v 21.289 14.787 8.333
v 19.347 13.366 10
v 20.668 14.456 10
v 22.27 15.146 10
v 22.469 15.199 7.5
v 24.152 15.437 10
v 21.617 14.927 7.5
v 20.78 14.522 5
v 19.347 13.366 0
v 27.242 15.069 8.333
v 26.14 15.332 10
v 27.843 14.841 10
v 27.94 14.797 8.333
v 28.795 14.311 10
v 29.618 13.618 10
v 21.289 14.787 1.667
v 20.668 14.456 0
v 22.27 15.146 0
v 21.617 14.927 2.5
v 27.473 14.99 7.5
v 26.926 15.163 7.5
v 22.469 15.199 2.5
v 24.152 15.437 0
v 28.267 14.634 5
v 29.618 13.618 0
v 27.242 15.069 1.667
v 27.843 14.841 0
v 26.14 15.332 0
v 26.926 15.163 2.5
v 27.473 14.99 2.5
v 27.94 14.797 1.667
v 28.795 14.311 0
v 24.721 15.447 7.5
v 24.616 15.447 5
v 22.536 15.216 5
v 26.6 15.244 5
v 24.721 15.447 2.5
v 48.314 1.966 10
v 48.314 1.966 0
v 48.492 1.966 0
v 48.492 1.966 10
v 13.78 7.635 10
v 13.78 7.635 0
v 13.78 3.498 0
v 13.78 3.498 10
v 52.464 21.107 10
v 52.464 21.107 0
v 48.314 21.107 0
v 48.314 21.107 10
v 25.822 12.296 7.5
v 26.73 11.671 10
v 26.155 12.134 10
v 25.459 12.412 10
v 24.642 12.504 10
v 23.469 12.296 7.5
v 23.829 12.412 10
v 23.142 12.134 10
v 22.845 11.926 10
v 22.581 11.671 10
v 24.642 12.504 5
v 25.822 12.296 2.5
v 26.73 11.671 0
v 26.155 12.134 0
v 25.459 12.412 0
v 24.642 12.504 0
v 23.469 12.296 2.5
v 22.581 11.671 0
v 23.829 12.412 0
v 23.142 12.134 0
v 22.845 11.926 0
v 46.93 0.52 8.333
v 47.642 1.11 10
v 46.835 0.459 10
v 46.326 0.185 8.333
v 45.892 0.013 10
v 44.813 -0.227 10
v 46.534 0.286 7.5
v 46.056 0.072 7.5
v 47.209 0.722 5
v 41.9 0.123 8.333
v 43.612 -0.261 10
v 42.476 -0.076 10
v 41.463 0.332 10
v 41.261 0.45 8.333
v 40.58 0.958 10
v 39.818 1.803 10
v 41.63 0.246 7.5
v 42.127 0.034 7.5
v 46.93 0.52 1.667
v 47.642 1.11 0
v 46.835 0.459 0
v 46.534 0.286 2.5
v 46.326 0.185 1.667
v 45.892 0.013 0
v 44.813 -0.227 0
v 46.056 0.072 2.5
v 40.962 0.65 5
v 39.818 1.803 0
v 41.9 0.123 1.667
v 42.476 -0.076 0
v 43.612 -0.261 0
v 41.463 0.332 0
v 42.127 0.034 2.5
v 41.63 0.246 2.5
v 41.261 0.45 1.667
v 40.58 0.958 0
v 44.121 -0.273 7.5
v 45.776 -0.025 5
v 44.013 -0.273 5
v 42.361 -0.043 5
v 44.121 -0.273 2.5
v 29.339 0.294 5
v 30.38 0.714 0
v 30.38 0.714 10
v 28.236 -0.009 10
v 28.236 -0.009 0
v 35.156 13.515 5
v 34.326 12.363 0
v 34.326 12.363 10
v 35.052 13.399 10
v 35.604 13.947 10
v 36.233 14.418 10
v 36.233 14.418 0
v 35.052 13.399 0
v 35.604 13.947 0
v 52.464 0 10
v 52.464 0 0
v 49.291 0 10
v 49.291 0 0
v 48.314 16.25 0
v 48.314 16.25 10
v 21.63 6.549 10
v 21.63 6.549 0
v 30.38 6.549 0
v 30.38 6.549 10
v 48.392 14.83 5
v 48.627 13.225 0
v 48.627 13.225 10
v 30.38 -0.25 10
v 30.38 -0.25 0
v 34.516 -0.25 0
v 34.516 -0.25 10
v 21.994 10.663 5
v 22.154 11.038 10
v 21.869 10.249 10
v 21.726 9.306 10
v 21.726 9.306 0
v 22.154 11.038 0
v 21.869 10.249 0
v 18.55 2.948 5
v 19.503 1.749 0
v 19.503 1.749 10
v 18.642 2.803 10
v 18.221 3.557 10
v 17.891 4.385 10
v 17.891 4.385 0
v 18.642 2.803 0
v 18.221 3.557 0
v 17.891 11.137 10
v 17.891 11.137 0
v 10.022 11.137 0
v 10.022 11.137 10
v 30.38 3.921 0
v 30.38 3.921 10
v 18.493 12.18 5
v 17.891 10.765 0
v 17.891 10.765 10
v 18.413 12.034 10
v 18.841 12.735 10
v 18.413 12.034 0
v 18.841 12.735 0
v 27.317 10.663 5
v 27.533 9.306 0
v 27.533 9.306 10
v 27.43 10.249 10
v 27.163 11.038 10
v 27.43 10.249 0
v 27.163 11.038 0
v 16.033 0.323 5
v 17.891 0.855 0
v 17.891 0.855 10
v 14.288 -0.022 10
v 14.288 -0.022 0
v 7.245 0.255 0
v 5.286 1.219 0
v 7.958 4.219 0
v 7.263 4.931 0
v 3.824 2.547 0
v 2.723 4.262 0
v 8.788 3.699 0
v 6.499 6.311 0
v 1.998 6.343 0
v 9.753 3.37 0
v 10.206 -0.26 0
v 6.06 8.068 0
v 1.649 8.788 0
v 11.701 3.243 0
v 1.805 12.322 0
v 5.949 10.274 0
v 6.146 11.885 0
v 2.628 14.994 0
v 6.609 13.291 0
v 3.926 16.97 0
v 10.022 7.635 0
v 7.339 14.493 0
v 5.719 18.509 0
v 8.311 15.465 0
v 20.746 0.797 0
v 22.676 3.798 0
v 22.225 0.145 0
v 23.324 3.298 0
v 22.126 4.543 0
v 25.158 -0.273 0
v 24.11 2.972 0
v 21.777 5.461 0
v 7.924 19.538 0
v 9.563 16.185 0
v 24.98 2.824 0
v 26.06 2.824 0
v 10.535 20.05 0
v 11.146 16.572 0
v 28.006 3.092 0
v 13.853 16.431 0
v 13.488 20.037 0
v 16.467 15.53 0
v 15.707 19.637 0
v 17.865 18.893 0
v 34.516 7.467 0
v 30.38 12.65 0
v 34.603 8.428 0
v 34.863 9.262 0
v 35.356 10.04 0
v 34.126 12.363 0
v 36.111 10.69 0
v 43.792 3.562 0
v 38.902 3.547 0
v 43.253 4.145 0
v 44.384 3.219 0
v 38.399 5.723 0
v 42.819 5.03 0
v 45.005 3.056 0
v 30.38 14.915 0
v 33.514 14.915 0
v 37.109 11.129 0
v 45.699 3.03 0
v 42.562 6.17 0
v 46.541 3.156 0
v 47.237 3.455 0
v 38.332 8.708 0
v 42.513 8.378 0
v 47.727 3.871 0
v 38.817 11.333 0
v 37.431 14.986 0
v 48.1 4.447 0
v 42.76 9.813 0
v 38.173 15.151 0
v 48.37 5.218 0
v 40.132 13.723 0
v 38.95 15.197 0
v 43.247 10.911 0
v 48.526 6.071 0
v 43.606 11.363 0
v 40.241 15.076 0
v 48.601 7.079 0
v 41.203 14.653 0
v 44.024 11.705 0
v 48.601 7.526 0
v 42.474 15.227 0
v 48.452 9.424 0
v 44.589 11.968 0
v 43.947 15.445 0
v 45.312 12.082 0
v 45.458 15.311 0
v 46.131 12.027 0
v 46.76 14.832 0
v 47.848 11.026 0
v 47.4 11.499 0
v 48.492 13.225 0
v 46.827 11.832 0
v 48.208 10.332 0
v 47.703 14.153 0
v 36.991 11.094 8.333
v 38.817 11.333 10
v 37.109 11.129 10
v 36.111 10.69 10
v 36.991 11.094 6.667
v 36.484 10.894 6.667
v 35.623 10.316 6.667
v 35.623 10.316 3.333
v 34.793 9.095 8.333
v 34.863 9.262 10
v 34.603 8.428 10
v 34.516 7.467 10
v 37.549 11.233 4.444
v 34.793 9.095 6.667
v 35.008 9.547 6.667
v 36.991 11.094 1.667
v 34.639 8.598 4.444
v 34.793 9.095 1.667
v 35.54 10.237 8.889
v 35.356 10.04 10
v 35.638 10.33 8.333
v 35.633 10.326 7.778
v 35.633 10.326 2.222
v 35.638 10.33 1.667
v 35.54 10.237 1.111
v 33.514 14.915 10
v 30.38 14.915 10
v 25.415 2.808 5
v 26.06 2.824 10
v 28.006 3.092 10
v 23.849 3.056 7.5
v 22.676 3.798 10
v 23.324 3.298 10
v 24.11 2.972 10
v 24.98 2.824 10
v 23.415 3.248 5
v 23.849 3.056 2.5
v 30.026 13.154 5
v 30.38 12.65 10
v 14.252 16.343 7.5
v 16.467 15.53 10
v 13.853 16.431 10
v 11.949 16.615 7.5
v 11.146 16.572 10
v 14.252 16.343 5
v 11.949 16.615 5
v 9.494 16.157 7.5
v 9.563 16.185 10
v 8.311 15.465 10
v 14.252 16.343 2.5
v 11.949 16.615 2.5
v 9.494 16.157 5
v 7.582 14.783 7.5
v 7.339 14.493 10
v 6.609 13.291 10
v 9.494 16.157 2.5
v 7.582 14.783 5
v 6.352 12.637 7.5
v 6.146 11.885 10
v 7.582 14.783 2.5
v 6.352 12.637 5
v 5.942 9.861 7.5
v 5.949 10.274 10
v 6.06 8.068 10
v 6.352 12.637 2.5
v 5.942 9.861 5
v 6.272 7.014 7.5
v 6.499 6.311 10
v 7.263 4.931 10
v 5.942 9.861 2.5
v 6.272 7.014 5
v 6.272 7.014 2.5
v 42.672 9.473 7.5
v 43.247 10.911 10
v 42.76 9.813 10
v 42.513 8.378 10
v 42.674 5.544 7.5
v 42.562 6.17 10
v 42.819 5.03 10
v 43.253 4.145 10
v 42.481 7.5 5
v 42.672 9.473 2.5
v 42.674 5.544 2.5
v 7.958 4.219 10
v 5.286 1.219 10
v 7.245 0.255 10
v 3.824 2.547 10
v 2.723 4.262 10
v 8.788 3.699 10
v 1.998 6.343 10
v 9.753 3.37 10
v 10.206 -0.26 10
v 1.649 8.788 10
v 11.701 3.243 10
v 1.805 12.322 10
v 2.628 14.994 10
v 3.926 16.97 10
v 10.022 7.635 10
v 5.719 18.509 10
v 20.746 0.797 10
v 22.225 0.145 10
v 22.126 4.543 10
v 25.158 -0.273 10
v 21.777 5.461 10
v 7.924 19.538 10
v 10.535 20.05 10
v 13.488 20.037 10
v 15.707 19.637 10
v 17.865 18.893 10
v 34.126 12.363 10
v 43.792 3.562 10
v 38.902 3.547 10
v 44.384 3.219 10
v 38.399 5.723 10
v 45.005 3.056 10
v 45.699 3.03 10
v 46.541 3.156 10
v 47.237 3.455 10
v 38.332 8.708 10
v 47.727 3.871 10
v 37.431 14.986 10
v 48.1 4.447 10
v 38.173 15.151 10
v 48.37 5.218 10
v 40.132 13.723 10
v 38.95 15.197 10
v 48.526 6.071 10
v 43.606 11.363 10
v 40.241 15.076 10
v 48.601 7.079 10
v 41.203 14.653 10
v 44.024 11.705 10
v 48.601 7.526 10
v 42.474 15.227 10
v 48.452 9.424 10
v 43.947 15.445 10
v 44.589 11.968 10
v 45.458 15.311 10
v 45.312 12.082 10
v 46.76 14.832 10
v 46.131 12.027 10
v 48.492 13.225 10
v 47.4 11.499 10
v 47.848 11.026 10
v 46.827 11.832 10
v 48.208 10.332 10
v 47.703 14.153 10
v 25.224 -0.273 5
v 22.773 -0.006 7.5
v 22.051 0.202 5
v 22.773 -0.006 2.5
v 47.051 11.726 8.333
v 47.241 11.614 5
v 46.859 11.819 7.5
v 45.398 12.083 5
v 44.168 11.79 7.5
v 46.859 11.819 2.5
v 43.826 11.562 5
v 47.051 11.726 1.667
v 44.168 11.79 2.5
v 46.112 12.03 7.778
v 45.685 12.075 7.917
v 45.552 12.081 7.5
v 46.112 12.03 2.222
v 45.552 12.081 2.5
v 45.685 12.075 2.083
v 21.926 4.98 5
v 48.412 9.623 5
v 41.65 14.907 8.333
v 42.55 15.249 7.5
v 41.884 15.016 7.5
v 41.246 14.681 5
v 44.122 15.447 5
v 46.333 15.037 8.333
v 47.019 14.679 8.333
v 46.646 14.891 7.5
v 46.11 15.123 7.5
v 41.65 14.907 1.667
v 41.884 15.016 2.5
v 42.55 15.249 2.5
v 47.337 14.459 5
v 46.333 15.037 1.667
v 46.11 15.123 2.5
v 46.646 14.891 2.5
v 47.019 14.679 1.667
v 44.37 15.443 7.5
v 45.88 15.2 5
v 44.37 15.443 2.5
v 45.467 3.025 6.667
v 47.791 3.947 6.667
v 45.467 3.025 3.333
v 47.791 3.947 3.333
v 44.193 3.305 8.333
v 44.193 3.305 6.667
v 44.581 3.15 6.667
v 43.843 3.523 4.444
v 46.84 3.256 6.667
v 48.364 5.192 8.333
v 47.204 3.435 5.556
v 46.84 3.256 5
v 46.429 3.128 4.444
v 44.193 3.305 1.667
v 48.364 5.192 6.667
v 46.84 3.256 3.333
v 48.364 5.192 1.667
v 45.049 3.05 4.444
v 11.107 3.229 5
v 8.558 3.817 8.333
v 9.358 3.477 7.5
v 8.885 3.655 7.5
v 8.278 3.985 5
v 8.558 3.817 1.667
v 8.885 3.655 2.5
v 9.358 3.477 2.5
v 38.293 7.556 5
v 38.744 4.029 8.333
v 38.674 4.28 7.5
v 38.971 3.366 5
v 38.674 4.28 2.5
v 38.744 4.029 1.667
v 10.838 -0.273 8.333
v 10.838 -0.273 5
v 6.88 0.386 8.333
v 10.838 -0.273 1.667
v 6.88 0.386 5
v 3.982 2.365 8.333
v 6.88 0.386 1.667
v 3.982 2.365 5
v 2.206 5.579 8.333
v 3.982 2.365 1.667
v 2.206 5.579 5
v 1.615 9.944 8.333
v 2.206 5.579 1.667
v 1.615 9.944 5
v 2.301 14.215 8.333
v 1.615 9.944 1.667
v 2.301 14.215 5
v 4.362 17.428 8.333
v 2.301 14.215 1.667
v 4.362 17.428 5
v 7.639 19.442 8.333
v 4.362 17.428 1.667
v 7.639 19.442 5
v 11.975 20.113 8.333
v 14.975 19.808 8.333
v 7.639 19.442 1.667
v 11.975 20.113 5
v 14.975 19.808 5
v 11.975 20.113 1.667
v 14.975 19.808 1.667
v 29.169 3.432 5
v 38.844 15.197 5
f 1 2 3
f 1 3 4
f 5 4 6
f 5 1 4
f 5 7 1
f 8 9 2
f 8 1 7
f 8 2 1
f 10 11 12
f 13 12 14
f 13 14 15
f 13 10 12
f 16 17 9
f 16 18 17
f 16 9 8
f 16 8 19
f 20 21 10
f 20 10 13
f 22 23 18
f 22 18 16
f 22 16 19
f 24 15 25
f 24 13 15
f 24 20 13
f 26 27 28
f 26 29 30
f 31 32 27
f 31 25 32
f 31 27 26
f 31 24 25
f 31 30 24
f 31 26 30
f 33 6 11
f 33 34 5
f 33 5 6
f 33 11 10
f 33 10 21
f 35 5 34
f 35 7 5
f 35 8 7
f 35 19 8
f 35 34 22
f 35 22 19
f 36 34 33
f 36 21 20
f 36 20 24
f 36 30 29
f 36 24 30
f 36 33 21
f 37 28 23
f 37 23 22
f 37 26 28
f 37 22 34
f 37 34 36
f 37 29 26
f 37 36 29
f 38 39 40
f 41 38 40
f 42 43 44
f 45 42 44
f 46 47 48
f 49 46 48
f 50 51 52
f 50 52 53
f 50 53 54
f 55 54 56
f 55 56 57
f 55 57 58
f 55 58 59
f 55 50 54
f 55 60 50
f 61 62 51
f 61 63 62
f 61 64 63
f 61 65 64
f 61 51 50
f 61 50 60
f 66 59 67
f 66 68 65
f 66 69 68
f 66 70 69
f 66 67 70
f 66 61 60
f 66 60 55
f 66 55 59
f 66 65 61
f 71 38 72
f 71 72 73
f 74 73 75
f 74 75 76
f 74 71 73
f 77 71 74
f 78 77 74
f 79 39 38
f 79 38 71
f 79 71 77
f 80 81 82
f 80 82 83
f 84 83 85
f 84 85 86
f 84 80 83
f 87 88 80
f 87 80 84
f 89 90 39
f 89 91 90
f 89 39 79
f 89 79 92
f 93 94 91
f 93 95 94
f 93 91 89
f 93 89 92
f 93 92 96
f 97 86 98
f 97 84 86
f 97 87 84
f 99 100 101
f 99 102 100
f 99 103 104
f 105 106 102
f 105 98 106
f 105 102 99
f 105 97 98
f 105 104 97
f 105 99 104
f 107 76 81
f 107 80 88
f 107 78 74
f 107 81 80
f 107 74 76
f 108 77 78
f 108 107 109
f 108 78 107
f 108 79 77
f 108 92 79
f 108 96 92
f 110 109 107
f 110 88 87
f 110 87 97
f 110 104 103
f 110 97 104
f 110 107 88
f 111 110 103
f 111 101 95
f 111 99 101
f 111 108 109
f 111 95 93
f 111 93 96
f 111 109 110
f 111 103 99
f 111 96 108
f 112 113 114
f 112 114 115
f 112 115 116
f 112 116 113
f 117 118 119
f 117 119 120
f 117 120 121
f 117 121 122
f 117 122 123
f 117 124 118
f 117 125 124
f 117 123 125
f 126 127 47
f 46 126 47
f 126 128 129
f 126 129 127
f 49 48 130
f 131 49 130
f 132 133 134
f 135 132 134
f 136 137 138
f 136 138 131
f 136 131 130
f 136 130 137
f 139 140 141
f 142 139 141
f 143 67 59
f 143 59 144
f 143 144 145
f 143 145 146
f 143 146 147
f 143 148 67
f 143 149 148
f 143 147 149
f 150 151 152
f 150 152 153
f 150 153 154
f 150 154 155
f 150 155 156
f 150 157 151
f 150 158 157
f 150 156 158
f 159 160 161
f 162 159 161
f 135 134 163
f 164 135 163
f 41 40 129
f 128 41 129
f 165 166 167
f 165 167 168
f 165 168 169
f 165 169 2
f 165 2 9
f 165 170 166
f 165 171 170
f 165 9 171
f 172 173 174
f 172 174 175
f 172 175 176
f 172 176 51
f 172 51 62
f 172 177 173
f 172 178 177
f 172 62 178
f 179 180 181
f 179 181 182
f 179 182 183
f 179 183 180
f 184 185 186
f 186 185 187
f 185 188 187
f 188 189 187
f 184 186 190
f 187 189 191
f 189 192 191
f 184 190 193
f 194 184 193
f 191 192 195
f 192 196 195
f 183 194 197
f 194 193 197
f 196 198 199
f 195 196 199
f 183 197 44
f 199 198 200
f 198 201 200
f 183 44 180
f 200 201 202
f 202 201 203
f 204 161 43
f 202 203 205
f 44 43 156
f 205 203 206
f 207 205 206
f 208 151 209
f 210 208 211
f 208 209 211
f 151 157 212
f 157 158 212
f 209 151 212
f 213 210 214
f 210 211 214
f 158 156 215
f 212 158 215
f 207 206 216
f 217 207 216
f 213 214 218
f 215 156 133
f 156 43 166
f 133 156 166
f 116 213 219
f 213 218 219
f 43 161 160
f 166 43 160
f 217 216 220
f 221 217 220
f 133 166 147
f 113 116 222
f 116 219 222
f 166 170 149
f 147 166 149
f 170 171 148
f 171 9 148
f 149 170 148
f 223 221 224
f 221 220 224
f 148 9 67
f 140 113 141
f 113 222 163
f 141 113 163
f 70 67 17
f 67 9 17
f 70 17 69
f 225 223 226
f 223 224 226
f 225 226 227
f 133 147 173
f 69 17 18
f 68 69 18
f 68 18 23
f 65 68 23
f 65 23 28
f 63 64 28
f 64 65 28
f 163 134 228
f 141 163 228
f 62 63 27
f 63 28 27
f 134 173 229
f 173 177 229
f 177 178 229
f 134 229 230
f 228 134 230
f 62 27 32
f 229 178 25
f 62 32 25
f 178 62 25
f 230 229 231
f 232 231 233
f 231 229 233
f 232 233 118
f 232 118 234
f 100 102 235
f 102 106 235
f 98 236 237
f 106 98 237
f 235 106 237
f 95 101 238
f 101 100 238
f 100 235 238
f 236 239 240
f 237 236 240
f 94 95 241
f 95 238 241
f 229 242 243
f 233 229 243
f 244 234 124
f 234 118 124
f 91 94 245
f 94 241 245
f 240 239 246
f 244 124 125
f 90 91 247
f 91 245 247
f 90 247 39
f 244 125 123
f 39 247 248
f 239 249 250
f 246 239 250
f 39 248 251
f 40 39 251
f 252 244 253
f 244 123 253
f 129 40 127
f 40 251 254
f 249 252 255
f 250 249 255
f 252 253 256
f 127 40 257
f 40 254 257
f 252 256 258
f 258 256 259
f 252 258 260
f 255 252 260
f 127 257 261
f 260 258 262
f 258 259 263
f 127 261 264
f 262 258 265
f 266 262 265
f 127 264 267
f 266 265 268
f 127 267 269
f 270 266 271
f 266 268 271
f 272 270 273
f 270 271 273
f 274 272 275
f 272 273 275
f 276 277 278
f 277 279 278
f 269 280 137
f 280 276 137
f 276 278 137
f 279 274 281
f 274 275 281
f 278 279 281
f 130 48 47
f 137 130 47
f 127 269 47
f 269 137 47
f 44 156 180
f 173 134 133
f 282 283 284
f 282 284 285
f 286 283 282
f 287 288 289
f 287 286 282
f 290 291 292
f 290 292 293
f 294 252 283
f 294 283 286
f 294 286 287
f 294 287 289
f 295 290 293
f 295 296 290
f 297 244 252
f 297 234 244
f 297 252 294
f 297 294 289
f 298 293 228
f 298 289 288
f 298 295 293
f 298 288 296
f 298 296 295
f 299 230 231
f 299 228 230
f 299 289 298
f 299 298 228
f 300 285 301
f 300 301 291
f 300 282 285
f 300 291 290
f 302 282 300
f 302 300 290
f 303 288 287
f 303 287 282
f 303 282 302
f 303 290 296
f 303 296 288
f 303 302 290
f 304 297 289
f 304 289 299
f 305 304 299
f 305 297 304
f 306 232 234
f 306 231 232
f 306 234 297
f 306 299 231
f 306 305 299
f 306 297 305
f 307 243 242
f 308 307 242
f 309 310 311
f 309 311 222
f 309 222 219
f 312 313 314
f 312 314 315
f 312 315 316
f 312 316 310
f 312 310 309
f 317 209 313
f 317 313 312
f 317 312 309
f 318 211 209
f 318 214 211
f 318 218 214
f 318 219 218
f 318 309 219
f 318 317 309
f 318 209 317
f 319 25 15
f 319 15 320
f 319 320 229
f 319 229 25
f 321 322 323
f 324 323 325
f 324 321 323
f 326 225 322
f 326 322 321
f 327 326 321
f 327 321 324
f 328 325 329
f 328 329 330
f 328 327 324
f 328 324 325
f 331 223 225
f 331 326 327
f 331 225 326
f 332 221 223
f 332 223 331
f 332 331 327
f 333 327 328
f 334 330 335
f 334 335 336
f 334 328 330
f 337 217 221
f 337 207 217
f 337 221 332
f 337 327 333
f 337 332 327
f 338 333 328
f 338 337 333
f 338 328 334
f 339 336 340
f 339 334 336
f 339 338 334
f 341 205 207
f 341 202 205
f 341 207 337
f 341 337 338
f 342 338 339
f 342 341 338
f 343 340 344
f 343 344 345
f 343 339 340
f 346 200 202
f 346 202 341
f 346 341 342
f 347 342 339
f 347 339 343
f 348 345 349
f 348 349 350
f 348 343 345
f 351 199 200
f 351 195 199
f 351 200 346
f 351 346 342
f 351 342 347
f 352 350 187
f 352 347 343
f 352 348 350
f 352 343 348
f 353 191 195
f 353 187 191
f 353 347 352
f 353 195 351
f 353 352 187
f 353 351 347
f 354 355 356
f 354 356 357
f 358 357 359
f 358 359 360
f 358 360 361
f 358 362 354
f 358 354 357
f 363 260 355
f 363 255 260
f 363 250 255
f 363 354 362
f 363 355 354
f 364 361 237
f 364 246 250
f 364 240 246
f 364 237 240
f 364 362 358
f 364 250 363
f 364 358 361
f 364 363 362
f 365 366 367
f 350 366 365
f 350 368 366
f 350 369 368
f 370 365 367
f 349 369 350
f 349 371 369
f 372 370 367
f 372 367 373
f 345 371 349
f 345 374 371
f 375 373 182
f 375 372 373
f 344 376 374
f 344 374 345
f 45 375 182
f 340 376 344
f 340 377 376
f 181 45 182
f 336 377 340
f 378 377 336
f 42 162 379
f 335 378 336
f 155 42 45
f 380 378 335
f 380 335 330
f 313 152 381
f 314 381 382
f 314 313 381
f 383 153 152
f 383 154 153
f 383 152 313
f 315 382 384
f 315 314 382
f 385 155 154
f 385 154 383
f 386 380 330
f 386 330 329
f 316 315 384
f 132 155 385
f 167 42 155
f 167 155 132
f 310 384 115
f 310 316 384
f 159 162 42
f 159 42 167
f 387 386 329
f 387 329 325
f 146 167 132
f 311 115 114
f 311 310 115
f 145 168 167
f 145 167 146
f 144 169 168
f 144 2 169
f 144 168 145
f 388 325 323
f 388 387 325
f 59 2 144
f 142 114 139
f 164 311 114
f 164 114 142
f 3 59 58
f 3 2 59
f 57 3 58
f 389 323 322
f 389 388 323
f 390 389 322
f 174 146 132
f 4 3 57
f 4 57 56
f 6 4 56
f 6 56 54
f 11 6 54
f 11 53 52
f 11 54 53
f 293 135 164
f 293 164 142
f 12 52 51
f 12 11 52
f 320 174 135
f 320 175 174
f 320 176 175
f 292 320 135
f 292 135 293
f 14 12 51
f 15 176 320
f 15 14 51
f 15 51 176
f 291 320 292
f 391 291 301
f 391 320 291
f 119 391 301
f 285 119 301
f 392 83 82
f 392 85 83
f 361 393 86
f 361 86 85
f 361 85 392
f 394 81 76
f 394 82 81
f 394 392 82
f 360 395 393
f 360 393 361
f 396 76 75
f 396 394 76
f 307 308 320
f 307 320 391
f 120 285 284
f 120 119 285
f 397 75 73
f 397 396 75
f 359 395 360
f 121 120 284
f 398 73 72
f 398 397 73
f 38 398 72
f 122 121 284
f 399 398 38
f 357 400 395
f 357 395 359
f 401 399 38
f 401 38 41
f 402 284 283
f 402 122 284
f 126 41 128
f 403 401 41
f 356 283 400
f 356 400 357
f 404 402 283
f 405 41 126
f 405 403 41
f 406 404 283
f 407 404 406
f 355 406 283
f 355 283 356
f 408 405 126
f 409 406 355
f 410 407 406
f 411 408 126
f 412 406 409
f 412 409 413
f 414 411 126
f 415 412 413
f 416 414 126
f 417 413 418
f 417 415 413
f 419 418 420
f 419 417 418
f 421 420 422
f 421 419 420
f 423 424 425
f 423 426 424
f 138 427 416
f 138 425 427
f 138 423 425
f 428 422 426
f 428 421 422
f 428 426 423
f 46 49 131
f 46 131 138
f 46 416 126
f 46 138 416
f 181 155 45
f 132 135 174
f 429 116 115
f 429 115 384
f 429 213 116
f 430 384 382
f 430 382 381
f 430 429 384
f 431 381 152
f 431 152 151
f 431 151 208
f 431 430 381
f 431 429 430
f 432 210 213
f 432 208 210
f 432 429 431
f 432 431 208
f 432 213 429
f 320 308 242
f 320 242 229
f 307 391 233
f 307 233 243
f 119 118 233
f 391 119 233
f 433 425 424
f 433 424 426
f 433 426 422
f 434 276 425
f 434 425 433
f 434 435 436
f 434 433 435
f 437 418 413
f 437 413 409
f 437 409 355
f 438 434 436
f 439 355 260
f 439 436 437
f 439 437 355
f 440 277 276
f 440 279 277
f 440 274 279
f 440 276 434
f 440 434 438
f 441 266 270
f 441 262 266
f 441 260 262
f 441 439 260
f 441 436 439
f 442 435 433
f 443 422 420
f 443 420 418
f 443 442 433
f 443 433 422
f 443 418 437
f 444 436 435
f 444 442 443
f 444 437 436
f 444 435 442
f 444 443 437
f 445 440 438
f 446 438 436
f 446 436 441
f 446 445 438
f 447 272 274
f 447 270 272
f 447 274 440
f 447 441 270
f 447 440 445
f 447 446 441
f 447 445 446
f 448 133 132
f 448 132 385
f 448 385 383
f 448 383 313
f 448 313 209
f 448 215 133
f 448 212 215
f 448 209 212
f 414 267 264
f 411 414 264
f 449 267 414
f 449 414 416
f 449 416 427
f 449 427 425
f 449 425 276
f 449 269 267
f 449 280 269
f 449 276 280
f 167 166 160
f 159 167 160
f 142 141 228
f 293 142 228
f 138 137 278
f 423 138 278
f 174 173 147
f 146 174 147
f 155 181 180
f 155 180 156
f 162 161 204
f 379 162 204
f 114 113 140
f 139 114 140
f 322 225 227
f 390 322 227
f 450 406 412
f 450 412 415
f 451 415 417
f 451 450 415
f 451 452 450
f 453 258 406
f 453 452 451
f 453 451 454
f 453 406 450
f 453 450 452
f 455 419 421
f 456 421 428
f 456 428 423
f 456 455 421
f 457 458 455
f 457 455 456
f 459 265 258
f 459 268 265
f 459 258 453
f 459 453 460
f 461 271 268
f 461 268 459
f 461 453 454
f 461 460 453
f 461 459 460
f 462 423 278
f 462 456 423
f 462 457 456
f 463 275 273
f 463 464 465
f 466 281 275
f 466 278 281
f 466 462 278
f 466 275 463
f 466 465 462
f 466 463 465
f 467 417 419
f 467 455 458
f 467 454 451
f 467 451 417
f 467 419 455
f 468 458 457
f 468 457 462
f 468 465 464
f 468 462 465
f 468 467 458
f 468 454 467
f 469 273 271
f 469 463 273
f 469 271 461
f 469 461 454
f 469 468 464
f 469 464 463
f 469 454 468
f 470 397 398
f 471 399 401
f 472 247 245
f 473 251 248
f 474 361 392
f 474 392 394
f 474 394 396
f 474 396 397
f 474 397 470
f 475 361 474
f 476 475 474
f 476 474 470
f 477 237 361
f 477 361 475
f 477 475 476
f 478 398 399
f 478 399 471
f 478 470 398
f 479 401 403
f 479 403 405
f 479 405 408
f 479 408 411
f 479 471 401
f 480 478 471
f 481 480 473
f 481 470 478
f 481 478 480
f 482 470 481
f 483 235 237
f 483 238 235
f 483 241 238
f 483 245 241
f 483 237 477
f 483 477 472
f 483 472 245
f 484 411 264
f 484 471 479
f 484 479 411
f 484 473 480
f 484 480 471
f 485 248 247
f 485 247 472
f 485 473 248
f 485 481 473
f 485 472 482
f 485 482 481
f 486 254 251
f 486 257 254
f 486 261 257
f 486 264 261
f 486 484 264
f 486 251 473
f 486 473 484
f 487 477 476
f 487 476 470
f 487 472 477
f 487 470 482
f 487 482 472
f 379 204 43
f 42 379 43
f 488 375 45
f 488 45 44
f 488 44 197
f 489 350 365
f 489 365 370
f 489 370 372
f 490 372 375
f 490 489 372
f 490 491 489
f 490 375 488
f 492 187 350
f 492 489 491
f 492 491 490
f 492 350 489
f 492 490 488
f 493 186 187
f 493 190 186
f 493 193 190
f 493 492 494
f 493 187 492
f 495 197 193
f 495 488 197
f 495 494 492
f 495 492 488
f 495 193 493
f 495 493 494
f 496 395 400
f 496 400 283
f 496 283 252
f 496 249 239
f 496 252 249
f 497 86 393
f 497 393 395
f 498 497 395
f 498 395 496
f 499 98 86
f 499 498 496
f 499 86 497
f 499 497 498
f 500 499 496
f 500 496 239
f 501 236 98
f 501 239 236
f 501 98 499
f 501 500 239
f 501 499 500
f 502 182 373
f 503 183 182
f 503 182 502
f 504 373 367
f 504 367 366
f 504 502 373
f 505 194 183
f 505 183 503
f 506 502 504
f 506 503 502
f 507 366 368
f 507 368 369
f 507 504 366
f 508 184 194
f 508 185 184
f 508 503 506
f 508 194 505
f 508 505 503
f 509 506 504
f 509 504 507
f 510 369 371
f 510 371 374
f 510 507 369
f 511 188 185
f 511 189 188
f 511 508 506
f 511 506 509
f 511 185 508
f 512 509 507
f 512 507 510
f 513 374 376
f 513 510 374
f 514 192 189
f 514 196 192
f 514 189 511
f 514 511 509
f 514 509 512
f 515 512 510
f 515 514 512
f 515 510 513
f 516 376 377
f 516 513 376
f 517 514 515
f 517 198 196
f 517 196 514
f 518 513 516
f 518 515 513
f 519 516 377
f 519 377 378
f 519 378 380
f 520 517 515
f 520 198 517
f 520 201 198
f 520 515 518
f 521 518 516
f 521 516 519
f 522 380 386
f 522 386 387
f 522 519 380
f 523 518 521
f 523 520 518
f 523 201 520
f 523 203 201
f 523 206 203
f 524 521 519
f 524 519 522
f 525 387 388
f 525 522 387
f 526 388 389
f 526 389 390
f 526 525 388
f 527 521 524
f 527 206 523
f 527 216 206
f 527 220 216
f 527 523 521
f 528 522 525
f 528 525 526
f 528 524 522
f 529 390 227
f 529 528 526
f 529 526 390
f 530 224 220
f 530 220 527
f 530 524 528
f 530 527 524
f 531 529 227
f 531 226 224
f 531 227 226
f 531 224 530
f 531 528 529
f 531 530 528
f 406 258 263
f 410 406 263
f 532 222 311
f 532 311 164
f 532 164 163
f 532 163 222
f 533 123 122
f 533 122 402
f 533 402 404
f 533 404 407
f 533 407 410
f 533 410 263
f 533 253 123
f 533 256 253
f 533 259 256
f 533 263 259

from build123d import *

# Parameters (mm, degrees)
F1_DEPTH = 10


with BuildPart() as f1:
    # F0 (on Top) → F1 (new body)
    with BuildSketch(Plane.XY):
        with BuildLine():
            Line((17.890625, 11.1371527778), (10.0217013889, 11.1371527778))
            Line((10.0217013889, 11.1371527778), (10.0217013889, 7.6345486111))
            Line((10.0217013889, 7.6345486111), (13.7803819444, 7.6345486111))
            Line((13.7803819444, 7.6345486111), (13.7803819444, 3.4982638889))
            add(Edge.make_bspline(
                [(11.1067708333, 3.2291666667), (12.4262152778, 3.2291666667), (13.7803819444, 3.4982638889)],
                knots=[0, 0, 0, 1, 1, 1], degree=2))
            add(Edge.make_bspline(
                [(7.2634548611, 4.9305555556), (8.5850694444, 3.2291666667), (11.1067708333, 3.2291666667)],
                knots=[0, 0, 0, 1, 1, 1], degree=2))
            add(Edge.make_bspline(
                [(5.9418402778, 9.8611111111), (5.9418402778, 6.6319444444), (7.2634548611, 4.9305555556)],
                knots=[0, 0, 0, 1, 1, 1], degree=2))
            add(Edge.make_bspline(
                [(7.5824652778, 14.7829861111), (5.9418402778, 12.9513888889), (5.9418402778, 9.8611111111)],
                knots=[0, 0, 0, 1, 1, 1], degree=2))
            add(Edge.make_bspline(
                [(11.9487847222, 16.6145833333), (9.2230902778, 16.6145833333), (7.5824652778, 14.7829861111)],
                knots=[0, 0, 0, 1, 1, 1], degree=2))
            add(Edge.make_bspline(
                [(16.4670138889, 15.5295138889), (14.296875, 16.6145833333), (11.9487847222, 16.6145833333)],
                knots=[0, 0, 0, 1, 1, 1], degree=2))
            Line((16.4670138889, 15.5295138889), (17.8645833333, 18.8932291667))
            add(Edge.make_bspline(
                [(11.9748263889, 20.1128472222), (15.0303819444, 20.1128472222), (17.8645833333, 18.8932291667)],
                knots=[0, 0, 0, 1, 1, 1], degree=2))
            add(Edge.make_bspline(
                [(4.3619791667, 17.4283854167), (7.109375, 20.1128472222), (11.9748263889, 20.1128472222)],
                knots=[0, 0, 0, 1, 1, 1], degree=2))
            add(Edge.make_bspline(
                [(1.6145833333, 9.9435763889), (1.6145833333, 14.7439236111), (4.3619791667, 17.4283854167)],
                knots=[0, 0, 0, 1, 1, 1], degree=2))
            add(Edge.make_bspline(
                [(3.9822048611, 2.3654513889), (1.6145833333, 5.0043402778), (1.6145833333, 9.9435763889)],
                knots=[0, 0, 0, 1, 1, 1], degree=2))
            add(Edge.make_bspline(
                [(10.8376736111, -0.2734375), (6.3498263889, -0.2734375), (3.9822048611, 2.3654513889)],
                knots=[0, 0, 0, 1, 1, 1], degree=2))
            add(Edge.make_bspline(
                [(14.2881944444, -0.0217013889), (12.5998263889, -0.2734375), (10.8376736111, -0.2734375)],
                knots=[0, 0, 0, 1, 1, 1], degree=2))
            add(Edge.make_bspline(
                [(17.890625, 0.8550347222), (15.9765625, 0.2300347222), (14.2881944444, -0.0217013889)],
                knots=[0, 0, 0, 1, 1, 1], degree=2))
            Line((17.890625, 0.8550347222), (17.890625, 4.3849023528))
            add(Edge.make_bspline(
                [(17.890625, 4.3849023528), (17.4418402778, 5.7466096194), (17.4418402778, 7.4739583333)],
                knots=[0.5334335947, 0.5334335947, 0.5334335947, 1, 1, 1], degree=2))
            add(Edge.make_bspline(
                [(17.4418402778, 7.4739583333), (17.4418402778, 9.3233974988), (17.890625, 10.7654546328)],
                knots=[0, 0, 0, 0.4853197992, 0.4853197992, 0.4853197992], degree=2))
            Line((17.890625, 10.7654546328), (17.890625, 11.1371527778))
        make_face()
        with BuildLine():
            add(Edge.make_bspline(
                [(17.890625, 10.7654546328), (18.3665598605, 12.2947519259), (19.3472222222, 13.3658854167)],
                knots=[0.4853197992, 0.4853197992, 0.4853197992, 1, 1, 1], degree=2))
            Line((17.890625, 10.7654546328), (17.890625, 4.3849023528))
            add(Edge.make_bspline(
                [(19.5034722222, 1.7491319444), (18.4037284831, 2.8280384338), (17.890625, 4.3849023528)],
                knots=[0, 0, 0, 0.5334335947, 0.5334335947, 0.5334335947], degree=2))
            add(Edge.make_bspline(
                [(25.2239583333, -0.2734375), (21.5651041667, -0.2734375), (19.5034722222, 1.7491319444)],
                knots=[0, 0, 0, 1, 1, 1], degree=2))
            add(Edge.make_bspline(
                [(28.2361111111, -0.0086805556), (27.0034722222, -0.2734375), (25.2239583333, -0.2734375)],
                knots=[0, 0, 0, 1, 1, 1], degree=2))
            add(Edge.make_bspline(
                [(30.3802083333, 0.7140314035), (29.370669575, 0.2350098187), (28.2361111111, -0.0086805556)],
                knots=[0.0795694715, 0.0795694715, 0.0795694715, 1, 1, 1], degree=2))
            Line((30.3802083333, 0.7140314035), (30.3802083333, 3.9212807597))
            add(Edge.make_bspline(
                [(28.0060763889, 3.0924479167), (29.1457668735, 3.3581053072), (30.3802083333, 3.9212807597)],
                knots=[0, 0, 0, 0.9344650807, 0.9344650807, 0.9344650807], degree=2))
            add(Edge.make_bspline(
                [(25.4149305556, 2.8081597222), (26.7864583333, 2.8081597222), (28.0060763889, 3.0924479167)],
                knots=[0, 0, 0, 1, 1, 1], degree=2))
            add(Edge.make_bspline(
                [(22.6762152778, 3.7977430556), (23.6527777778, 2.8081597222), (25.4149305556, 2.8081597222)],
                knots=[0, 0, 0, 1, 1, 1], degree=2))
            add(Edge.make_bspline(
                [(21.6302083333, 6.5494791667), (21.6996527778, 4.7873263889), (22.6762152778, 3.7977430556)],
                knots=[0, 0, 0, 1, 1, 1], degree=2))
            Line((21.6302083333, 6.5494791667), (30.3802083333, 6.5494791667))
            Line((30.3802083333, 6.5494791667), (30.3802083333, 12.6501514229))
            add(Edge.make_bspline(
                [(29.6184895833, 13.6176215278), (30.0517797145, 13.1748777938), (30.3802083333, 12.6501514229)],
                knots=[0, 0, 0, 0.2420122332, 0.2420122332, 0.2420122332], degree=2))
            add(Edge.make_bspline(
                [(24.6163194444, 15.4470486111), (27.828125, 15.4470486111), (29.6184895833, 13.6176215278)],
                knots=[0, 0, 0, 1, 1, 1], degree=2))
            add(Edge.make_bspline(
                [(19.3472222222, 13.3658854167), (21.2526041667, 15.4470486111), (24.6163194444, 15.4470486111)],
                knots=[0, 0, 0, 1, 1, 1], degree=2))
        make_face()
        with BuildLine():
            add(Edge.make_bspline(
                [(24.6423611111, 12.5043402778), (23.3272569444, 12.5043402778), (22.5807291667, 11.6710069444)],
                knots=[0, 0, 0, 1, 1, 1], degree=2))
            add(Edge.make_bspline(
                [(26.7300347222, 11.6710069444), (25.9574652778, 12.5043402778), (24.6423611111, 12.5043402778)],
                knots=[0, 0, 0, 1, 1, 1], degree=2))
            add(Edge.make_bspline(
                [(27.5329861111, 9.3055555556), (27.5026041667, 10.8376736111), (26.7300347222, 11.6710069444)],
                knots=[0, 0, 0, 1, 1, 1], degree=2))
            Line((27.5329861111, 9.3055555556), (21.7256944444, 9.3055555556))
            add(Edge.make_bspline(
                [(22.5807291667, 11.6710069444), (21.8342013889, 10.8376736111), (21.7256944444, 9.3055555556)],
                knots=[0, 0, 0, 1, 1, 1], degree=2))
        make_face(mode=Mode.SUBTRACT)
        with BuildLine():
            Line((17.890625, 4.3849023528), (17.890625, 10.7654546328))
            add(Edge.make_bspline(
                [(17.4418402778, 7.4739583333), (17.4418402778, 9.3233974988), (17.890625, 10.7654546328)],
                knots=[0, 0, 0, 0.4853197992, 0.4853197992, 0.4853197992], degree=2))
            add(Edge.make_bspline(
                [(17.890625, 4.3849023528), (17.4418402778, 5.7466096194), (17.4418402778, 7.4739583333)],
                knots=[0.5334335947, 0.5334335947, 0.5334335947, 1, 1, 1], degree=2))
        make_face()
        with BuildLine():
            Line((30.3802083333, 14.9149305556), (30.3802083333, 12.6501514229))
            add(Edge.make_bspline(
                [(30.3802083333, 12.6501514229), (31.4088541667, 11.0066966079), (31.4088541667, 8.5590277778)],
                knots=[0.2420122332, 0.2420122332, 0.2420122332, 1, 1, 1], degree=2))
            Line((31.4088541667, 8.5590277778), (31.4088541667, 6.5494791667))
            Line((31.4088541667, 6.5494791667), (30.3802083333, 6.5494791667))
            Line((30.3802083333, 6.5494791667), (30.3802083333, 3.9212807597))
            add(Edge.make_bspline(
                [(30.3802083333, 3.9212807597), (30.4667808797, 3.9607767865), (30.5538194444, 4.0017361111)],
                knots=[0.9344650807, 0.9344650807, 0.9344650807, 1, 1, 1], degree=2))
            Line((30.5538194444, 4.0017361111), (30.5538194444, 0.7986111111))
            add(Edge.make_bspline(
                [(30.5538194444, 0.7986111111), (30.4674810422, 0.75544191), (30.3802083333, 0.7140314035)],
                knots=[0, 0, 0, 0.0795694715, 0.0795694715, 0.0795694715], degree=2))
            Line((30.3802083333, 0.7140314035), (30.3802083333, -0.25))
            Line((30.3802083333, -0.25), (34.5164930556, -0.25))
            Line((34.5164930556, -0.25), (34.5164930556, 7.4670138889))
            add(Edge.make_bspline(
                [(35.6232638889, 10.31640625), (34.5164930556, 9.2986111111), (34.5164930556, 7.4670138889)],
                knots=[0, 0, 0, 1, 1, 1], degree=2))
            add(Edge.make_bspline(
                [(38.7092013889, 11.3342013889), (36.7300347222, 11.3342013889), (35.6232638889, 10.31640625)],
                knots=[0, 0, 0, 1, 1, 1], degree=2))
            add(Edge.make_bspline(
                [(38.8165486425, 11.3334282993), (38.7634860059, 11.3342013889), (38.7092013889, 11.3342013889)],
                knots=[0.9241989348, 0.9241989348, 0.9241989348, 1, 1, 1], degree=2))
            add(Edge.make_bspline(
                [(38.8165486425, 11.3334282993), (39.1942474456, 12.4941522946), (39.8441840278, 13.3658854167)],
                knots=[0.5811317803, 0.5811317803, 0.5811317803, 1, 1, 1], degree=2))
            add(Edge.make_bspline(
                [(39.8441840278, 13.3658854167), (39.9834871312, 13.5527269218), (40.1322530254, 13.7227942749)],
                knots=[0, 0, 0, 0.0897774407, 0.0897774407, 0.0897774407], degree=2))
            Line((40.1322530254, 13.7227942749), (40.2413194444, 15.0755208333))
            add(Edge.make_bspline(
                [(38.84375, 15.1970486111), (39.6857638889, 15.1970486111), (40.2413194444, 15.0755208333)],
                knots=[0, 0, 0, 1, 1, 1], degree=2))
            add(Edge.make_bspline(
                [(36.2330729167, 14.41796875), (37.4331597222, 15.1970486111), (38.84375, 15.1970486111)],
                knots=[0, 0, 0, 1, 1, 1], degree=2))
            add(Edge.make_bspline(
                [(34.3255208333, 12.3628472222), (35.0329861111, 13.6388888889), (36.2330729167, 14.41796875)],
                knots=[0, 0, 0, 1, 1, 1], degree=2))
            Line((34.3255208333, 12.3628472222), (34.1258680556, 12.3628472222))
            Line((34.1258680556, 12.3628472222), (33.5138888889, 14.9149305556))
            Line((33.5138888889, 14.9149305556), (30.3802083333, 14.9149305556))
        make_face()
        with BuildLine():
            add(Edge.make_bspline(
                [(30.3802083333, 12.6501514229), (31.4088541667, 11.0066966079), (31.4088541667, 8.5590277778)],
                knots=[0.2420122332, 0.2420122332, 0.2420122332, 1, 1, 1], degree=2))
            Line((30.3802083333, 12.6501514229), (30.3802083333, 6.5494791667))
            Line((30.3802083333, 6.5494791667), (31.4088541667, 6.5494791667))
            Line((31.4088541667, 6.5494791667), (31.4088541667, 8.5590277778))
        make_face()
        with BuildLine():
            Line((30.3802083333, 3.9212807597), (30.3802083333, 0.7140314035))
            add(Edge.make_bspline(
                [(30.5538194444, 0.7986111111), (30.4674810422, 0.75544191), (30.3802083333, 0.7140314035)],
                knots=[0, 0, 0, 0.0795694715, 0.0795694715, 0.0795694715], degree=2))
            Line((30.5538194444, 0.7986111111), (30.5538194444, 4.0017361111))
            add(Edge.make_bspline(
                [(30.3802083333, 3.9212807597), (30.4667808797, 3.9607767865), (30.5538194444, 4.0017361111)],
                knots=[0.9344650807, 0.9344650807, 0.9344650807, 1, 1, 1], degree=2))
        make_face()
        with BuildLine():
            add(Edge.make_bspline(
                [(38.8165486425, 11.3334282993), (39.1942474456, 12.4941522946), (39.8441840278, 13.3658854167)],
                knots=[0.5811317803, 0.5811317803, 0.5811317803, 1, 1, 1], degree=2))
            add(Edge.make_bspline(
                [(39.9288194444, 11.1996527778), (39.4635109529, 11.3240024608), (38.8165486425, 11.3334282993)],
                knots=[0, 0, 0, 0.9241989348, 0.9241989348, 0.9241989348], degree=2))
            Line((39.9288194444, 11.1996527778), (40.1322530254, 13.7227942749))
            add(Edge.make_bspline(
                [(39.8441840278, 13.3658854167), (39.9834871312, 13.5527269218), (40.1322530254, 13.7227942749)],
                knots=[0, 0, 0, 0.0897774407, 0.0897774407, 0.0897774407], degree=2))
        make_face()
        with BuildLine():
            add(Edge.make_bspline(
                [(39.9288194444, 11.1996527778), (39.4635109529, 11.3240024608), (38.8165486425, 11.3334282993)],
                knots=[0, 0, 0, 0.9241989348, 0.9241989348, 0.9241989348], degree=2))
            add(Edge.make_bspline(
                [(38.2925347222, 7.5564236111), (38.2925347222, 9.7230564206), (38.8165486425, 11.3334282993)],
                knots=[0, 0, 0, 0.5811317803, 0.5811317803, 0.5811317803], degree=2))
            add(Edge.make_bspline(
                [(39.8181423611, 1.8033854167), (38.2925347222, 3.8802083333), (38.2925347222, 7.5564236111)],
                knots=[0, 0, 0, 1, 1, 1], degree=2))
            add(Edge.make_bspline(
                [(44.0130208333, -0.2734375), (41.34375, -0.2734375), (39.8181423611, 1.8033854167)],
                knots=[0, 0, 0, 1, 1, 1], degree=2))
            add(Edge.make_bspline(
                [(48.3142361111, 1.9661458333), (46.9036458333, -0.2734375), (44.0130208333, -0.2734375)],
                knots=[0, 0, 0, 1, 1, 1], degree=2))
            Line((48.3142361111, 1.9661458333), (48.4921875, 1.9661458333))
            Line((48.4921875, 1.9661458333), (49.2907986111, 0))
            Line((49.2907986111, 0), (52.4635416667, 0))
            Line((52.4635416667, 0), (52.4635416667, 21.1067708333))
            Line((52.4635416667, 21.1067708333), (48.3142361111, 21.1067708333))
            Line((48.3142361111, 21.1067708333), (48.3142361111, 16.25))
            add(Edge.make_bspline(
                [(48.6267361111, 13.2248263889), (48.3142361111, 14.921875), (48.3142361111, 16.25)],
                knots=[0, 0, 0, 1, 1, 1], degree=2))
            Line((48.6267361111, 13.2248263889), (48.4921875, 13.2248263889))
            add(Edge.make_bspline(
                [(44.1215277778, 15.4470486111), (46.9861111111, 15.4470486111), (48.4921875, 13.2248263889)],
                knots=[0, 0, 0, 1, 1, 1], degree=2))
            add(Edge.make_bspline(
                [(40.1322530254, 13.7227942749), (41.6405392046, 15.4470486111), (44.1215277778, 15.4470486111)],
                knots=[0.0897774407, 0.0897774407, 0.0897774407, 1, 1, 1], degree=2))
            Line((40.1322530254, 13.7227942749), (39.9288194444, 11.1996527778))
        make_face()
        with BuildLine():
            add(Edge.make_bspline(
                [(45.4670138889, 3.0251736111), (47.0512152778, 3.0251736111), (47.7912326389, 3.9474826389)],
                knots=[0, 0, 0, 1, 1, 1], degree=2))
            add(Edge.make_bspline(
                [(43.2534722222, 4.1449652778), (44.0260416667, 3.0251736111), (45.4670138889, 3.0251736111)],
                knots=[0, 0, 0, 1, 1, 1], degree=2))
            add(Edge.make_bspline(
                [(42.4809027778, 7.5), (42.4809027778, 5.2647569444), (43.2534722222, 4.1449652778)],
                knots=[0, 0, 0, 1, 1, 1], degree=2))
            add(Edge.make_bspline(
                [(43.2469618056, 10.9114583333), (42.4809027778, 9.7395833333), (42.4809027778, 7.5)],
                knots=[0, 0, 0, 1, 1, 1], degree=2))
            add(Edge.make_bspline(
                [(45.3975694444, 12.0833333333), (44.0130208333, 12.0833333333), (43.2469618056, 10.9114583333)],
                knots=[0, 0, 0, 1, 1, 1], degree=2))
            add(Edge.make_bspline(
                [(47.84765625, 11.0264756944), (47.0946180556, 12.0833333333), (45.3975694444, 12.0833333333)],
                knots=[0, 0, 0, 1, 1, 1], degree=2))
            add(Edge.make_bspline(
                [(48.6006944444, 7.5260416667), (48.6006944444, 9.9696180556), (47.84765625, 11.0264756944)],
                knots=[0, 0, 0, 1, 1, 1], degree=2))
            Line((48.6006944444, 7.5260416667), (48.6006944444, 7.0789930556))
            add(Edge.make_bspline(
                [(47.7912326389, 3.9474826389), (48.53125, 4.8697916667), (48.6006944444, 7.0789930556)],
                knots=[0, 0, 0, 1, 1, 1], degree=2))
        make_face(mode=Mode.SUBTRACT)
    extrude(amount=F1_DEPTH)


solid = f1.part
